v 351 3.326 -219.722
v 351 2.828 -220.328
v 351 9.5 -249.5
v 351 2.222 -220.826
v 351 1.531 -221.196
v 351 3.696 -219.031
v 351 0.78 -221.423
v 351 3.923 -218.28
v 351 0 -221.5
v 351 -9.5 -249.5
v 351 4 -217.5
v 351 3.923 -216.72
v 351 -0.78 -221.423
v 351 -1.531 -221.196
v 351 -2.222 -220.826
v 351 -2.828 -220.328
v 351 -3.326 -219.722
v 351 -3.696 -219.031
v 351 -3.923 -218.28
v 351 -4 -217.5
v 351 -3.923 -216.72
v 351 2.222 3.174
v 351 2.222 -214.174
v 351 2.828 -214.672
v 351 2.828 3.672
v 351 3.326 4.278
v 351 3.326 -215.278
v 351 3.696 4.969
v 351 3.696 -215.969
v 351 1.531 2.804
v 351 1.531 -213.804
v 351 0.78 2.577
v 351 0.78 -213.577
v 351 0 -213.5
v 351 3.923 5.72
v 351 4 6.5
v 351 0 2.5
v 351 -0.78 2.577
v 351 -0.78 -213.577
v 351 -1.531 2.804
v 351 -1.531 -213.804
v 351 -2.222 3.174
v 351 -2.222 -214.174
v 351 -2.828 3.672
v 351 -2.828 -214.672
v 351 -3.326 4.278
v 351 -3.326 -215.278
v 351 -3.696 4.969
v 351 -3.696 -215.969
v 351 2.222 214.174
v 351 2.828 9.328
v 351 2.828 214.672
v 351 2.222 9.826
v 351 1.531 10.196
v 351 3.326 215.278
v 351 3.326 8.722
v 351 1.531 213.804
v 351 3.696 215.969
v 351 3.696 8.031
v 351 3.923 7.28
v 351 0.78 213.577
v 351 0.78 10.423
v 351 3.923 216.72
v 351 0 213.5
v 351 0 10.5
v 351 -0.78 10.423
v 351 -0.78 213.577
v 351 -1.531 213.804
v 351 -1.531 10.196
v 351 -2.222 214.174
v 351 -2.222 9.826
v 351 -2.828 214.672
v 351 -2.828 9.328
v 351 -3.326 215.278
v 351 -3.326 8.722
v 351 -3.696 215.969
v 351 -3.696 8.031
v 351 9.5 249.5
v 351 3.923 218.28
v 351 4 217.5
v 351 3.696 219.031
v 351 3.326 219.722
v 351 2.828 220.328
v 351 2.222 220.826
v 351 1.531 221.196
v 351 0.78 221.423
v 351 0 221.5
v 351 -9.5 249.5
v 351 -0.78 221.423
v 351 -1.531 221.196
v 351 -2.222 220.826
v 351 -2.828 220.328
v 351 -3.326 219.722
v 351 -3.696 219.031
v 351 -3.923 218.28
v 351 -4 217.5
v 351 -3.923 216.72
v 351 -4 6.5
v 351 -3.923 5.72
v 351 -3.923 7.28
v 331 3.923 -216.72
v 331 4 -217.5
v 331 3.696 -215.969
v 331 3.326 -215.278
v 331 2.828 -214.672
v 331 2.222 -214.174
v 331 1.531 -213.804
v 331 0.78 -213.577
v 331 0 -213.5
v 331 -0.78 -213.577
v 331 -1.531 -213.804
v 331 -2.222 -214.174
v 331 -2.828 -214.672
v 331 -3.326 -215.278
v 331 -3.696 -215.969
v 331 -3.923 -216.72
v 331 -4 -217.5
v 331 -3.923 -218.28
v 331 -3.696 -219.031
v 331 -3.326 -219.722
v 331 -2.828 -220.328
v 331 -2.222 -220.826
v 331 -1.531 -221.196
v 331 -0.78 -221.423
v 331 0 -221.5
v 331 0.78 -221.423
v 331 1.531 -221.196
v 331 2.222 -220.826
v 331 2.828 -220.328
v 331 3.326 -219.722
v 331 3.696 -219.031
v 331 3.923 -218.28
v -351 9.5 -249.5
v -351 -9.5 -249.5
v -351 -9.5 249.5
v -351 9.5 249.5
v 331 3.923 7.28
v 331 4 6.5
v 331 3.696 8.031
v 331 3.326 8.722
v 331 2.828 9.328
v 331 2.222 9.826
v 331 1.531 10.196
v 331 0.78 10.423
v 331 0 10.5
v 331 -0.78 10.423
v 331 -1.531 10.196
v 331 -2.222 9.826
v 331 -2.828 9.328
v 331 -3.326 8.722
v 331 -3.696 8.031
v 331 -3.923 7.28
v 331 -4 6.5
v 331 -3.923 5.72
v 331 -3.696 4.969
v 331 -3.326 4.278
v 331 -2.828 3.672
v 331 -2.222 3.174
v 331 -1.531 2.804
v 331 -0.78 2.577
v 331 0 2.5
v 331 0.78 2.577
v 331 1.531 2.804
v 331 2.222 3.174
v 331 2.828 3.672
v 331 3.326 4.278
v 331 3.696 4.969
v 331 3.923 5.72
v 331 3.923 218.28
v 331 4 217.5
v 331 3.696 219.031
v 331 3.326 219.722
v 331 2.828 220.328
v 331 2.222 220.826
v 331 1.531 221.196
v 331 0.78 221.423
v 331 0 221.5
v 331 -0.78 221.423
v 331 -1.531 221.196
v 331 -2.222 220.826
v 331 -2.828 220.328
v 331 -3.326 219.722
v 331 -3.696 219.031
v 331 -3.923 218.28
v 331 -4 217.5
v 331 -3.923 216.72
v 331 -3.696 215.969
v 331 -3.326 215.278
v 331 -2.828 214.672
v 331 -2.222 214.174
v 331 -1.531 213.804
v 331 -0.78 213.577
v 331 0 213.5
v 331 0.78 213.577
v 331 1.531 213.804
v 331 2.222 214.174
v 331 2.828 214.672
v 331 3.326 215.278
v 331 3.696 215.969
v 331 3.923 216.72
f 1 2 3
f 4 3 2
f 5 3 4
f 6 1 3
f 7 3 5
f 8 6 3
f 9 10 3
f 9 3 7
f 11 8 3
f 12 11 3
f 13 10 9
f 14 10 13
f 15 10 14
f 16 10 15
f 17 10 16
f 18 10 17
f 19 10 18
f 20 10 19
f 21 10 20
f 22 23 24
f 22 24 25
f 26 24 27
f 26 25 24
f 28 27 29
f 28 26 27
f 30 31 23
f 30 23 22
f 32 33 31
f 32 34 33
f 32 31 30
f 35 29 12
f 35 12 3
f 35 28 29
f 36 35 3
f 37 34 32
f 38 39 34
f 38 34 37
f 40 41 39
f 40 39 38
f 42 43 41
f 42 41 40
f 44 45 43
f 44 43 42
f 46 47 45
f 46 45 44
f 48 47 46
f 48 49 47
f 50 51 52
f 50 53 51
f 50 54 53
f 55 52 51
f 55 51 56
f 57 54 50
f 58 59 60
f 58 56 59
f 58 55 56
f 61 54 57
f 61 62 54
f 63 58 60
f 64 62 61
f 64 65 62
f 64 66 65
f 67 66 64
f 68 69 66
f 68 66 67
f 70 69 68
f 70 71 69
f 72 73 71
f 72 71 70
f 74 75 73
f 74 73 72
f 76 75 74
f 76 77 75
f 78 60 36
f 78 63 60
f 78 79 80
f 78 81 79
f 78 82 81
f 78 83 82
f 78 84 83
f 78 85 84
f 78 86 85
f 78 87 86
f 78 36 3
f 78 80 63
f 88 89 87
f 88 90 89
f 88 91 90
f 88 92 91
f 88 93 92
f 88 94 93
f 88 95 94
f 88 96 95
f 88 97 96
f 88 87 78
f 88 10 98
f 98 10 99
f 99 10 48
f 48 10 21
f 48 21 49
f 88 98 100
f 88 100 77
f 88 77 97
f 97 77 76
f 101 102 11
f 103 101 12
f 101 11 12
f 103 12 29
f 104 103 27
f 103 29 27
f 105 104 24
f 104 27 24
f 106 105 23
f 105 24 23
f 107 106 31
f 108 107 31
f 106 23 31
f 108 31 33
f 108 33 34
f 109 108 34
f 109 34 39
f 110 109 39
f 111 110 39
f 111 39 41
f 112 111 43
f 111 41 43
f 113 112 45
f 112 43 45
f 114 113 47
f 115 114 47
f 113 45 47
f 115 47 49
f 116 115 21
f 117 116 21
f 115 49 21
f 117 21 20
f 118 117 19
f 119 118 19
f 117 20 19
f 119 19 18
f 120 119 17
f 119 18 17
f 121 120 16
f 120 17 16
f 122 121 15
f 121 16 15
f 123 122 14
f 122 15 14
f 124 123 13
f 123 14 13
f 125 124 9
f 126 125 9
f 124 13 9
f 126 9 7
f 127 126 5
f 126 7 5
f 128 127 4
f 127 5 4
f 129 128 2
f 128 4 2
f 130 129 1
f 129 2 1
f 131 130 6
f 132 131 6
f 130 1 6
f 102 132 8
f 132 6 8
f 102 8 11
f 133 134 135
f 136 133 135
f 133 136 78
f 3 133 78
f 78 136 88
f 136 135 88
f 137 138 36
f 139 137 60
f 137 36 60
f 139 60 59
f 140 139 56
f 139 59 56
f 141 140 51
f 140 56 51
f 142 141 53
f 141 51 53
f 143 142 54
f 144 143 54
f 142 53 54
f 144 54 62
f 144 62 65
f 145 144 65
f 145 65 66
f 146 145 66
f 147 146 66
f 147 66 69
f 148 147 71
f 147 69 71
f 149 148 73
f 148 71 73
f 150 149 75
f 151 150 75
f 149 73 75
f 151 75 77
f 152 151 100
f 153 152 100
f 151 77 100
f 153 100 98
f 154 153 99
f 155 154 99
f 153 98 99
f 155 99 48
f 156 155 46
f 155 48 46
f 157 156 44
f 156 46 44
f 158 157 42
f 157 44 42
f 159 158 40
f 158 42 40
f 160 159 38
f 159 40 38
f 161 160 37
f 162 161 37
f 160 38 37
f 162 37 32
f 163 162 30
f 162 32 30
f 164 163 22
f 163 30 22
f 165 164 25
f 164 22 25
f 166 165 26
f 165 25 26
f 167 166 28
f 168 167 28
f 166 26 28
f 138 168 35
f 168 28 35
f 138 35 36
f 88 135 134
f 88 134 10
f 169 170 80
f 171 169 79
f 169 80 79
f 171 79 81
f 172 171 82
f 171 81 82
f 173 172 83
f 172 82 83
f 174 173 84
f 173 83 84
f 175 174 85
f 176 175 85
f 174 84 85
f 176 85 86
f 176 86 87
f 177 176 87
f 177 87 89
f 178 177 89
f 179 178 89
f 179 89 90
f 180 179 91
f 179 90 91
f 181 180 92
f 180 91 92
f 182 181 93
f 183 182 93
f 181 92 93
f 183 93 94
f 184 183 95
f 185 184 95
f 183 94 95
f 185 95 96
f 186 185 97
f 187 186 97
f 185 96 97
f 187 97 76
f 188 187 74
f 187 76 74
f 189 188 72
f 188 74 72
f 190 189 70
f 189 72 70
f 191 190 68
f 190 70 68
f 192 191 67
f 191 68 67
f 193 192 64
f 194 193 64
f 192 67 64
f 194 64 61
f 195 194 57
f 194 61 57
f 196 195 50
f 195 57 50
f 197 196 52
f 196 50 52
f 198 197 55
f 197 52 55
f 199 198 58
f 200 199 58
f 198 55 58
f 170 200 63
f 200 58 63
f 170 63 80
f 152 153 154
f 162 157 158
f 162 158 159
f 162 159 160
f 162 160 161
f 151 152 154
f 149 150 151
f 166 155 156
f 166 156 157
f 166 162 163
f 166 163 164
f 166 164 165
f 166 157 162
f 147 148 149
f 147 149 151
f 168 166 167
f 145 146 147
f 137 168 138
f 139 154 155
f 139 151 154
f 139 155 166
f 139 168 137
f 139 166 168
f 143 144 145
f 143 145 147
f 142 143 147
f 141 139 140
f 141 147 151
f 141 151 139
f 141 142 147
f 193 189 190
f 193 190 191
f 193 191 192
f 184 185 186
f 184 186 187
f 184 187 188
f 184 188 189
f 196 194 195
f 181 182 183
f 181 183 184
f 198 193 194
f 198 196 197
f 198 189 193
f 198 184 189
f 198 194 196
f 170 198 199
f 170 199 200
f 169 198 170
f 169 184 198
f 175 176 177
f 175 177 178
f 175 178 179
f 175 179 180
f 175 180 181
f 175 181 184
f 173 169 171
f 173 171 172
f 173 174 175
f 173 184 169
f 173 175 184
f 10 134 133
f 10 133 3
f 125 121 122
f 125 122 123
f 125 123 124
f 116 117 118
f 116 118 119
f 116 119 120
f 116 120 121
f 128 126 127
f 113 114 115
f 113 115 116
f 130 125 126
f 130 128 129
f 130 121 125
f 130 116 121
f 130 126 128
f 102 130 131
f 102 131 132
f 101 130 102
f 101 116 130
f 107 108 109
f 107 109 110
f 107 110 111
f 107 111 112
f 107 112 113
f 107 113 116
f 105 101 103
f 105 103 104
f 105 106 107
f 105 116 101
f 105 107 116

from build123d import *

# Parameters (mm, degrees)
F0_W     = 702
F0_H     = 499
F1_DEPTH = 9.5
F2_R     = 4
F3_DEPTH = 20


with BuildPart() as f1:
    # F0 (on Front) → F1 (new body, symmetric)
    with BuildSketch(Plane.XZ):
        Rectangle(F0_W, F0_H)
    extrude(amount=F1_DEPTH, both=True)

    # F2 (on face) → F3 (cut)
    with BuildSketch(Plane.YZ.offset(351)):
        with Locations((0, 217.5)):
            Circle(F2_R)
        with Locations((0, 6.5)):
            Circle(F2_R)
        with Locations((0, -217.5)):
            Circle(F2_R)
    extrude(amount=-F3_DEPTH, mode=Mode.SUBTRACT)


solid = f1.part
